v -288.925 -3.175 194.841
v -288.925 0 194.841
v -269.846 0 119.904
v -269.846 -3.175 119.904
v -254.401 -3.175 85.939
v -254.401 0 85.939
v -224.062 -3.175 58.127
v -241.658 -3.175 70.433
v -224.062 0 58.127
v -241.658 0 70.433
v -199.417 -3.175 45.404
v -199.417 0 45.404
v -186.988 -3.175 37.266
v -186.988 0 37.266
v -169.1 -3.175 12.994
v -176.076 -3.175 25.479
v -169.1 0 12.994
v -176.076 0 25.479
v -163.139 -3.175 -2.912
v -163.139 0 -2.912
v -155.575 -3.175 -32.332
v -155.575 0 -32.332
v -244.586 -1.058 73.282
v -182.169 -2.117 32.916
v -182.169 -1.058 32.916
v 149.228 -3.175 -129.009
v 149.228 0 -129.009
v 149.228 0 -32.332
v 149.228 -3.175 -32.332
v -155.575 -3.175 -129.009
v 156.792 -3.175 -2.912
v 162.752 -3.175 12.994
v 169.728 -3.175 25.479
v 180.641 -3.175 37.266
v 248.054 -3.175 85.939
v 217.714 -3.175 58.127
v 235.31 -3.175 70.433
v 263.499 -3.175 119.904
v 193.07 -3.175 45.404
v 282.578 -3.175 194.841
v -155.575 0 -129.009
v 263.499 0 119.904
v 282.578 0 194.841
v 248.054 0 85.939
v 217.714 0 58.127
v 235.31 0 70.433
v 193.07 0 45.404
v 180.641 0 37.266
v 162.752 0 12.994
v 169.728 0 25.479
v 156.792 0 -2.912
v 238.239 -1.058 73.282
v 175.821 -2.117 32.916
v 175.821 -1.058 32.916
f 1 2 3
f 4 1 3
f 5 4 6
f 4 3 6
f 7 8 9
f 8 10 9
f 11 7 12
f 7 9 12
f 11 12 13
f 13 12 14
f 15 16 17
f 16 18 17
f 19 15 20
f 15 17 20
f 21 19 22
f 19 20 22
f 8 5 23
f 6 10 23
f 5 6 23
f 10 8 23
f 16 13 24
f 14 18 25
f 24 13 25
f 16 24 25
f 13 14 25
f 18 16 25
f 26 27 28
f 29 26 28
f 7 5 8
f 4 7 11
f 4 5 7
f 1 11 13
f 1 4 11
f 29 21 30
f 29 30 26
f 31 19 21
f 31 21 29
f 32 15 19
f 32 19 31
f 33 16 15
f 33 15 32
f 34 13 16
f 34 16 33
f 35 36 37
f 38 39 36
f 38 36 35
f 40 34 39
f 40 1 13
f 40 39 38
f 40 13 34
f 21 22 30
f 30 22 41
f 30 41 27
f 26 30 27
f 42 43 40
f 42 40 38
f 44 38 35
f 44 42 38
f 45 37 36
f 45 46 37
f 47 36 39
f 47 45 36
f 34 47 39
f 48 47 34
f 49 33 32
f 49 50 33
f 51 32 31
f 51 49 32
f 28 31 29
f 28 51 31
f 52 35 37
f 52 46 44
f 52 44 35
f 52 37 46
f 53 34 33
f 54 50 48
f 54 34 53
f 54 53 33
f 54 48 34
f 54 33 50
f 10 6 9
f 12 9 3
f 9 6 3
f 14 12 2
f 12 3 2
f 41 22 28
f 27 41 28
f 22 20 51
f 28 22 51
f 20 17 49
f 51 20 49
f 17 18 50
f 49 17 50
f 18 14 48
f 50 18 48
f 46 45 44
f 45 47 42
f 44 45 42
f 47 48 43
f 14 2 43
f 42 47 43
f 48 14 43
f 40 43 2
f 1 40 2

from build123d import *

# Parameters (mm, degrees)
F1_DEPTH = 3.175


with BuildPart() as f1:
    # F0 (on Front) → F1 (new body)
    with BuildSketch(Plane.XZ):
        with BuildLine():
            Line((282.57754, 194.8408979861), (-288.925, 194.8408979861))
            add(Edge.make_bspline(
                [(-288.925, 194.8408979861), (-278.6233532347, 150.2992306177), (-262.0291645214, 59.6695220489), (-171.9617879516, 45.4775987316), (-160.5512149407, -11.5136408638), (-155.575, -32.3317494782)],
                knots=[0, 0, 0, 0, 0.400661789, 0.7043403436, 1, 1, 1, 1], degree=3))
            Line((-155.575, -32.3317494782), (-155.575, -129.0091020139))
            Line((-155.575, -129.0091020139), (149.22754, -129.0091020139))
            Line((149.22754, -129.0091020139), (149.22754, -32.3317494782))
            add(Edge.make_bspline(
                [(282.57754, 194.8408979861), (272.2758932347, 150.2992306177), (255.6817045214, 59.6695220489), (165.6143279516, 45.4775987316), (154.2037549407, -11.5136408638), (149.22754, -32.3317494782)],
                knots=[0, 0, 0, 0, 0.400661789, 0.7043403436, 1, 1, 1, 1], degree=3))
        make_face()
    extrude(amount=F1_DEPTH)


solid = f1.part
